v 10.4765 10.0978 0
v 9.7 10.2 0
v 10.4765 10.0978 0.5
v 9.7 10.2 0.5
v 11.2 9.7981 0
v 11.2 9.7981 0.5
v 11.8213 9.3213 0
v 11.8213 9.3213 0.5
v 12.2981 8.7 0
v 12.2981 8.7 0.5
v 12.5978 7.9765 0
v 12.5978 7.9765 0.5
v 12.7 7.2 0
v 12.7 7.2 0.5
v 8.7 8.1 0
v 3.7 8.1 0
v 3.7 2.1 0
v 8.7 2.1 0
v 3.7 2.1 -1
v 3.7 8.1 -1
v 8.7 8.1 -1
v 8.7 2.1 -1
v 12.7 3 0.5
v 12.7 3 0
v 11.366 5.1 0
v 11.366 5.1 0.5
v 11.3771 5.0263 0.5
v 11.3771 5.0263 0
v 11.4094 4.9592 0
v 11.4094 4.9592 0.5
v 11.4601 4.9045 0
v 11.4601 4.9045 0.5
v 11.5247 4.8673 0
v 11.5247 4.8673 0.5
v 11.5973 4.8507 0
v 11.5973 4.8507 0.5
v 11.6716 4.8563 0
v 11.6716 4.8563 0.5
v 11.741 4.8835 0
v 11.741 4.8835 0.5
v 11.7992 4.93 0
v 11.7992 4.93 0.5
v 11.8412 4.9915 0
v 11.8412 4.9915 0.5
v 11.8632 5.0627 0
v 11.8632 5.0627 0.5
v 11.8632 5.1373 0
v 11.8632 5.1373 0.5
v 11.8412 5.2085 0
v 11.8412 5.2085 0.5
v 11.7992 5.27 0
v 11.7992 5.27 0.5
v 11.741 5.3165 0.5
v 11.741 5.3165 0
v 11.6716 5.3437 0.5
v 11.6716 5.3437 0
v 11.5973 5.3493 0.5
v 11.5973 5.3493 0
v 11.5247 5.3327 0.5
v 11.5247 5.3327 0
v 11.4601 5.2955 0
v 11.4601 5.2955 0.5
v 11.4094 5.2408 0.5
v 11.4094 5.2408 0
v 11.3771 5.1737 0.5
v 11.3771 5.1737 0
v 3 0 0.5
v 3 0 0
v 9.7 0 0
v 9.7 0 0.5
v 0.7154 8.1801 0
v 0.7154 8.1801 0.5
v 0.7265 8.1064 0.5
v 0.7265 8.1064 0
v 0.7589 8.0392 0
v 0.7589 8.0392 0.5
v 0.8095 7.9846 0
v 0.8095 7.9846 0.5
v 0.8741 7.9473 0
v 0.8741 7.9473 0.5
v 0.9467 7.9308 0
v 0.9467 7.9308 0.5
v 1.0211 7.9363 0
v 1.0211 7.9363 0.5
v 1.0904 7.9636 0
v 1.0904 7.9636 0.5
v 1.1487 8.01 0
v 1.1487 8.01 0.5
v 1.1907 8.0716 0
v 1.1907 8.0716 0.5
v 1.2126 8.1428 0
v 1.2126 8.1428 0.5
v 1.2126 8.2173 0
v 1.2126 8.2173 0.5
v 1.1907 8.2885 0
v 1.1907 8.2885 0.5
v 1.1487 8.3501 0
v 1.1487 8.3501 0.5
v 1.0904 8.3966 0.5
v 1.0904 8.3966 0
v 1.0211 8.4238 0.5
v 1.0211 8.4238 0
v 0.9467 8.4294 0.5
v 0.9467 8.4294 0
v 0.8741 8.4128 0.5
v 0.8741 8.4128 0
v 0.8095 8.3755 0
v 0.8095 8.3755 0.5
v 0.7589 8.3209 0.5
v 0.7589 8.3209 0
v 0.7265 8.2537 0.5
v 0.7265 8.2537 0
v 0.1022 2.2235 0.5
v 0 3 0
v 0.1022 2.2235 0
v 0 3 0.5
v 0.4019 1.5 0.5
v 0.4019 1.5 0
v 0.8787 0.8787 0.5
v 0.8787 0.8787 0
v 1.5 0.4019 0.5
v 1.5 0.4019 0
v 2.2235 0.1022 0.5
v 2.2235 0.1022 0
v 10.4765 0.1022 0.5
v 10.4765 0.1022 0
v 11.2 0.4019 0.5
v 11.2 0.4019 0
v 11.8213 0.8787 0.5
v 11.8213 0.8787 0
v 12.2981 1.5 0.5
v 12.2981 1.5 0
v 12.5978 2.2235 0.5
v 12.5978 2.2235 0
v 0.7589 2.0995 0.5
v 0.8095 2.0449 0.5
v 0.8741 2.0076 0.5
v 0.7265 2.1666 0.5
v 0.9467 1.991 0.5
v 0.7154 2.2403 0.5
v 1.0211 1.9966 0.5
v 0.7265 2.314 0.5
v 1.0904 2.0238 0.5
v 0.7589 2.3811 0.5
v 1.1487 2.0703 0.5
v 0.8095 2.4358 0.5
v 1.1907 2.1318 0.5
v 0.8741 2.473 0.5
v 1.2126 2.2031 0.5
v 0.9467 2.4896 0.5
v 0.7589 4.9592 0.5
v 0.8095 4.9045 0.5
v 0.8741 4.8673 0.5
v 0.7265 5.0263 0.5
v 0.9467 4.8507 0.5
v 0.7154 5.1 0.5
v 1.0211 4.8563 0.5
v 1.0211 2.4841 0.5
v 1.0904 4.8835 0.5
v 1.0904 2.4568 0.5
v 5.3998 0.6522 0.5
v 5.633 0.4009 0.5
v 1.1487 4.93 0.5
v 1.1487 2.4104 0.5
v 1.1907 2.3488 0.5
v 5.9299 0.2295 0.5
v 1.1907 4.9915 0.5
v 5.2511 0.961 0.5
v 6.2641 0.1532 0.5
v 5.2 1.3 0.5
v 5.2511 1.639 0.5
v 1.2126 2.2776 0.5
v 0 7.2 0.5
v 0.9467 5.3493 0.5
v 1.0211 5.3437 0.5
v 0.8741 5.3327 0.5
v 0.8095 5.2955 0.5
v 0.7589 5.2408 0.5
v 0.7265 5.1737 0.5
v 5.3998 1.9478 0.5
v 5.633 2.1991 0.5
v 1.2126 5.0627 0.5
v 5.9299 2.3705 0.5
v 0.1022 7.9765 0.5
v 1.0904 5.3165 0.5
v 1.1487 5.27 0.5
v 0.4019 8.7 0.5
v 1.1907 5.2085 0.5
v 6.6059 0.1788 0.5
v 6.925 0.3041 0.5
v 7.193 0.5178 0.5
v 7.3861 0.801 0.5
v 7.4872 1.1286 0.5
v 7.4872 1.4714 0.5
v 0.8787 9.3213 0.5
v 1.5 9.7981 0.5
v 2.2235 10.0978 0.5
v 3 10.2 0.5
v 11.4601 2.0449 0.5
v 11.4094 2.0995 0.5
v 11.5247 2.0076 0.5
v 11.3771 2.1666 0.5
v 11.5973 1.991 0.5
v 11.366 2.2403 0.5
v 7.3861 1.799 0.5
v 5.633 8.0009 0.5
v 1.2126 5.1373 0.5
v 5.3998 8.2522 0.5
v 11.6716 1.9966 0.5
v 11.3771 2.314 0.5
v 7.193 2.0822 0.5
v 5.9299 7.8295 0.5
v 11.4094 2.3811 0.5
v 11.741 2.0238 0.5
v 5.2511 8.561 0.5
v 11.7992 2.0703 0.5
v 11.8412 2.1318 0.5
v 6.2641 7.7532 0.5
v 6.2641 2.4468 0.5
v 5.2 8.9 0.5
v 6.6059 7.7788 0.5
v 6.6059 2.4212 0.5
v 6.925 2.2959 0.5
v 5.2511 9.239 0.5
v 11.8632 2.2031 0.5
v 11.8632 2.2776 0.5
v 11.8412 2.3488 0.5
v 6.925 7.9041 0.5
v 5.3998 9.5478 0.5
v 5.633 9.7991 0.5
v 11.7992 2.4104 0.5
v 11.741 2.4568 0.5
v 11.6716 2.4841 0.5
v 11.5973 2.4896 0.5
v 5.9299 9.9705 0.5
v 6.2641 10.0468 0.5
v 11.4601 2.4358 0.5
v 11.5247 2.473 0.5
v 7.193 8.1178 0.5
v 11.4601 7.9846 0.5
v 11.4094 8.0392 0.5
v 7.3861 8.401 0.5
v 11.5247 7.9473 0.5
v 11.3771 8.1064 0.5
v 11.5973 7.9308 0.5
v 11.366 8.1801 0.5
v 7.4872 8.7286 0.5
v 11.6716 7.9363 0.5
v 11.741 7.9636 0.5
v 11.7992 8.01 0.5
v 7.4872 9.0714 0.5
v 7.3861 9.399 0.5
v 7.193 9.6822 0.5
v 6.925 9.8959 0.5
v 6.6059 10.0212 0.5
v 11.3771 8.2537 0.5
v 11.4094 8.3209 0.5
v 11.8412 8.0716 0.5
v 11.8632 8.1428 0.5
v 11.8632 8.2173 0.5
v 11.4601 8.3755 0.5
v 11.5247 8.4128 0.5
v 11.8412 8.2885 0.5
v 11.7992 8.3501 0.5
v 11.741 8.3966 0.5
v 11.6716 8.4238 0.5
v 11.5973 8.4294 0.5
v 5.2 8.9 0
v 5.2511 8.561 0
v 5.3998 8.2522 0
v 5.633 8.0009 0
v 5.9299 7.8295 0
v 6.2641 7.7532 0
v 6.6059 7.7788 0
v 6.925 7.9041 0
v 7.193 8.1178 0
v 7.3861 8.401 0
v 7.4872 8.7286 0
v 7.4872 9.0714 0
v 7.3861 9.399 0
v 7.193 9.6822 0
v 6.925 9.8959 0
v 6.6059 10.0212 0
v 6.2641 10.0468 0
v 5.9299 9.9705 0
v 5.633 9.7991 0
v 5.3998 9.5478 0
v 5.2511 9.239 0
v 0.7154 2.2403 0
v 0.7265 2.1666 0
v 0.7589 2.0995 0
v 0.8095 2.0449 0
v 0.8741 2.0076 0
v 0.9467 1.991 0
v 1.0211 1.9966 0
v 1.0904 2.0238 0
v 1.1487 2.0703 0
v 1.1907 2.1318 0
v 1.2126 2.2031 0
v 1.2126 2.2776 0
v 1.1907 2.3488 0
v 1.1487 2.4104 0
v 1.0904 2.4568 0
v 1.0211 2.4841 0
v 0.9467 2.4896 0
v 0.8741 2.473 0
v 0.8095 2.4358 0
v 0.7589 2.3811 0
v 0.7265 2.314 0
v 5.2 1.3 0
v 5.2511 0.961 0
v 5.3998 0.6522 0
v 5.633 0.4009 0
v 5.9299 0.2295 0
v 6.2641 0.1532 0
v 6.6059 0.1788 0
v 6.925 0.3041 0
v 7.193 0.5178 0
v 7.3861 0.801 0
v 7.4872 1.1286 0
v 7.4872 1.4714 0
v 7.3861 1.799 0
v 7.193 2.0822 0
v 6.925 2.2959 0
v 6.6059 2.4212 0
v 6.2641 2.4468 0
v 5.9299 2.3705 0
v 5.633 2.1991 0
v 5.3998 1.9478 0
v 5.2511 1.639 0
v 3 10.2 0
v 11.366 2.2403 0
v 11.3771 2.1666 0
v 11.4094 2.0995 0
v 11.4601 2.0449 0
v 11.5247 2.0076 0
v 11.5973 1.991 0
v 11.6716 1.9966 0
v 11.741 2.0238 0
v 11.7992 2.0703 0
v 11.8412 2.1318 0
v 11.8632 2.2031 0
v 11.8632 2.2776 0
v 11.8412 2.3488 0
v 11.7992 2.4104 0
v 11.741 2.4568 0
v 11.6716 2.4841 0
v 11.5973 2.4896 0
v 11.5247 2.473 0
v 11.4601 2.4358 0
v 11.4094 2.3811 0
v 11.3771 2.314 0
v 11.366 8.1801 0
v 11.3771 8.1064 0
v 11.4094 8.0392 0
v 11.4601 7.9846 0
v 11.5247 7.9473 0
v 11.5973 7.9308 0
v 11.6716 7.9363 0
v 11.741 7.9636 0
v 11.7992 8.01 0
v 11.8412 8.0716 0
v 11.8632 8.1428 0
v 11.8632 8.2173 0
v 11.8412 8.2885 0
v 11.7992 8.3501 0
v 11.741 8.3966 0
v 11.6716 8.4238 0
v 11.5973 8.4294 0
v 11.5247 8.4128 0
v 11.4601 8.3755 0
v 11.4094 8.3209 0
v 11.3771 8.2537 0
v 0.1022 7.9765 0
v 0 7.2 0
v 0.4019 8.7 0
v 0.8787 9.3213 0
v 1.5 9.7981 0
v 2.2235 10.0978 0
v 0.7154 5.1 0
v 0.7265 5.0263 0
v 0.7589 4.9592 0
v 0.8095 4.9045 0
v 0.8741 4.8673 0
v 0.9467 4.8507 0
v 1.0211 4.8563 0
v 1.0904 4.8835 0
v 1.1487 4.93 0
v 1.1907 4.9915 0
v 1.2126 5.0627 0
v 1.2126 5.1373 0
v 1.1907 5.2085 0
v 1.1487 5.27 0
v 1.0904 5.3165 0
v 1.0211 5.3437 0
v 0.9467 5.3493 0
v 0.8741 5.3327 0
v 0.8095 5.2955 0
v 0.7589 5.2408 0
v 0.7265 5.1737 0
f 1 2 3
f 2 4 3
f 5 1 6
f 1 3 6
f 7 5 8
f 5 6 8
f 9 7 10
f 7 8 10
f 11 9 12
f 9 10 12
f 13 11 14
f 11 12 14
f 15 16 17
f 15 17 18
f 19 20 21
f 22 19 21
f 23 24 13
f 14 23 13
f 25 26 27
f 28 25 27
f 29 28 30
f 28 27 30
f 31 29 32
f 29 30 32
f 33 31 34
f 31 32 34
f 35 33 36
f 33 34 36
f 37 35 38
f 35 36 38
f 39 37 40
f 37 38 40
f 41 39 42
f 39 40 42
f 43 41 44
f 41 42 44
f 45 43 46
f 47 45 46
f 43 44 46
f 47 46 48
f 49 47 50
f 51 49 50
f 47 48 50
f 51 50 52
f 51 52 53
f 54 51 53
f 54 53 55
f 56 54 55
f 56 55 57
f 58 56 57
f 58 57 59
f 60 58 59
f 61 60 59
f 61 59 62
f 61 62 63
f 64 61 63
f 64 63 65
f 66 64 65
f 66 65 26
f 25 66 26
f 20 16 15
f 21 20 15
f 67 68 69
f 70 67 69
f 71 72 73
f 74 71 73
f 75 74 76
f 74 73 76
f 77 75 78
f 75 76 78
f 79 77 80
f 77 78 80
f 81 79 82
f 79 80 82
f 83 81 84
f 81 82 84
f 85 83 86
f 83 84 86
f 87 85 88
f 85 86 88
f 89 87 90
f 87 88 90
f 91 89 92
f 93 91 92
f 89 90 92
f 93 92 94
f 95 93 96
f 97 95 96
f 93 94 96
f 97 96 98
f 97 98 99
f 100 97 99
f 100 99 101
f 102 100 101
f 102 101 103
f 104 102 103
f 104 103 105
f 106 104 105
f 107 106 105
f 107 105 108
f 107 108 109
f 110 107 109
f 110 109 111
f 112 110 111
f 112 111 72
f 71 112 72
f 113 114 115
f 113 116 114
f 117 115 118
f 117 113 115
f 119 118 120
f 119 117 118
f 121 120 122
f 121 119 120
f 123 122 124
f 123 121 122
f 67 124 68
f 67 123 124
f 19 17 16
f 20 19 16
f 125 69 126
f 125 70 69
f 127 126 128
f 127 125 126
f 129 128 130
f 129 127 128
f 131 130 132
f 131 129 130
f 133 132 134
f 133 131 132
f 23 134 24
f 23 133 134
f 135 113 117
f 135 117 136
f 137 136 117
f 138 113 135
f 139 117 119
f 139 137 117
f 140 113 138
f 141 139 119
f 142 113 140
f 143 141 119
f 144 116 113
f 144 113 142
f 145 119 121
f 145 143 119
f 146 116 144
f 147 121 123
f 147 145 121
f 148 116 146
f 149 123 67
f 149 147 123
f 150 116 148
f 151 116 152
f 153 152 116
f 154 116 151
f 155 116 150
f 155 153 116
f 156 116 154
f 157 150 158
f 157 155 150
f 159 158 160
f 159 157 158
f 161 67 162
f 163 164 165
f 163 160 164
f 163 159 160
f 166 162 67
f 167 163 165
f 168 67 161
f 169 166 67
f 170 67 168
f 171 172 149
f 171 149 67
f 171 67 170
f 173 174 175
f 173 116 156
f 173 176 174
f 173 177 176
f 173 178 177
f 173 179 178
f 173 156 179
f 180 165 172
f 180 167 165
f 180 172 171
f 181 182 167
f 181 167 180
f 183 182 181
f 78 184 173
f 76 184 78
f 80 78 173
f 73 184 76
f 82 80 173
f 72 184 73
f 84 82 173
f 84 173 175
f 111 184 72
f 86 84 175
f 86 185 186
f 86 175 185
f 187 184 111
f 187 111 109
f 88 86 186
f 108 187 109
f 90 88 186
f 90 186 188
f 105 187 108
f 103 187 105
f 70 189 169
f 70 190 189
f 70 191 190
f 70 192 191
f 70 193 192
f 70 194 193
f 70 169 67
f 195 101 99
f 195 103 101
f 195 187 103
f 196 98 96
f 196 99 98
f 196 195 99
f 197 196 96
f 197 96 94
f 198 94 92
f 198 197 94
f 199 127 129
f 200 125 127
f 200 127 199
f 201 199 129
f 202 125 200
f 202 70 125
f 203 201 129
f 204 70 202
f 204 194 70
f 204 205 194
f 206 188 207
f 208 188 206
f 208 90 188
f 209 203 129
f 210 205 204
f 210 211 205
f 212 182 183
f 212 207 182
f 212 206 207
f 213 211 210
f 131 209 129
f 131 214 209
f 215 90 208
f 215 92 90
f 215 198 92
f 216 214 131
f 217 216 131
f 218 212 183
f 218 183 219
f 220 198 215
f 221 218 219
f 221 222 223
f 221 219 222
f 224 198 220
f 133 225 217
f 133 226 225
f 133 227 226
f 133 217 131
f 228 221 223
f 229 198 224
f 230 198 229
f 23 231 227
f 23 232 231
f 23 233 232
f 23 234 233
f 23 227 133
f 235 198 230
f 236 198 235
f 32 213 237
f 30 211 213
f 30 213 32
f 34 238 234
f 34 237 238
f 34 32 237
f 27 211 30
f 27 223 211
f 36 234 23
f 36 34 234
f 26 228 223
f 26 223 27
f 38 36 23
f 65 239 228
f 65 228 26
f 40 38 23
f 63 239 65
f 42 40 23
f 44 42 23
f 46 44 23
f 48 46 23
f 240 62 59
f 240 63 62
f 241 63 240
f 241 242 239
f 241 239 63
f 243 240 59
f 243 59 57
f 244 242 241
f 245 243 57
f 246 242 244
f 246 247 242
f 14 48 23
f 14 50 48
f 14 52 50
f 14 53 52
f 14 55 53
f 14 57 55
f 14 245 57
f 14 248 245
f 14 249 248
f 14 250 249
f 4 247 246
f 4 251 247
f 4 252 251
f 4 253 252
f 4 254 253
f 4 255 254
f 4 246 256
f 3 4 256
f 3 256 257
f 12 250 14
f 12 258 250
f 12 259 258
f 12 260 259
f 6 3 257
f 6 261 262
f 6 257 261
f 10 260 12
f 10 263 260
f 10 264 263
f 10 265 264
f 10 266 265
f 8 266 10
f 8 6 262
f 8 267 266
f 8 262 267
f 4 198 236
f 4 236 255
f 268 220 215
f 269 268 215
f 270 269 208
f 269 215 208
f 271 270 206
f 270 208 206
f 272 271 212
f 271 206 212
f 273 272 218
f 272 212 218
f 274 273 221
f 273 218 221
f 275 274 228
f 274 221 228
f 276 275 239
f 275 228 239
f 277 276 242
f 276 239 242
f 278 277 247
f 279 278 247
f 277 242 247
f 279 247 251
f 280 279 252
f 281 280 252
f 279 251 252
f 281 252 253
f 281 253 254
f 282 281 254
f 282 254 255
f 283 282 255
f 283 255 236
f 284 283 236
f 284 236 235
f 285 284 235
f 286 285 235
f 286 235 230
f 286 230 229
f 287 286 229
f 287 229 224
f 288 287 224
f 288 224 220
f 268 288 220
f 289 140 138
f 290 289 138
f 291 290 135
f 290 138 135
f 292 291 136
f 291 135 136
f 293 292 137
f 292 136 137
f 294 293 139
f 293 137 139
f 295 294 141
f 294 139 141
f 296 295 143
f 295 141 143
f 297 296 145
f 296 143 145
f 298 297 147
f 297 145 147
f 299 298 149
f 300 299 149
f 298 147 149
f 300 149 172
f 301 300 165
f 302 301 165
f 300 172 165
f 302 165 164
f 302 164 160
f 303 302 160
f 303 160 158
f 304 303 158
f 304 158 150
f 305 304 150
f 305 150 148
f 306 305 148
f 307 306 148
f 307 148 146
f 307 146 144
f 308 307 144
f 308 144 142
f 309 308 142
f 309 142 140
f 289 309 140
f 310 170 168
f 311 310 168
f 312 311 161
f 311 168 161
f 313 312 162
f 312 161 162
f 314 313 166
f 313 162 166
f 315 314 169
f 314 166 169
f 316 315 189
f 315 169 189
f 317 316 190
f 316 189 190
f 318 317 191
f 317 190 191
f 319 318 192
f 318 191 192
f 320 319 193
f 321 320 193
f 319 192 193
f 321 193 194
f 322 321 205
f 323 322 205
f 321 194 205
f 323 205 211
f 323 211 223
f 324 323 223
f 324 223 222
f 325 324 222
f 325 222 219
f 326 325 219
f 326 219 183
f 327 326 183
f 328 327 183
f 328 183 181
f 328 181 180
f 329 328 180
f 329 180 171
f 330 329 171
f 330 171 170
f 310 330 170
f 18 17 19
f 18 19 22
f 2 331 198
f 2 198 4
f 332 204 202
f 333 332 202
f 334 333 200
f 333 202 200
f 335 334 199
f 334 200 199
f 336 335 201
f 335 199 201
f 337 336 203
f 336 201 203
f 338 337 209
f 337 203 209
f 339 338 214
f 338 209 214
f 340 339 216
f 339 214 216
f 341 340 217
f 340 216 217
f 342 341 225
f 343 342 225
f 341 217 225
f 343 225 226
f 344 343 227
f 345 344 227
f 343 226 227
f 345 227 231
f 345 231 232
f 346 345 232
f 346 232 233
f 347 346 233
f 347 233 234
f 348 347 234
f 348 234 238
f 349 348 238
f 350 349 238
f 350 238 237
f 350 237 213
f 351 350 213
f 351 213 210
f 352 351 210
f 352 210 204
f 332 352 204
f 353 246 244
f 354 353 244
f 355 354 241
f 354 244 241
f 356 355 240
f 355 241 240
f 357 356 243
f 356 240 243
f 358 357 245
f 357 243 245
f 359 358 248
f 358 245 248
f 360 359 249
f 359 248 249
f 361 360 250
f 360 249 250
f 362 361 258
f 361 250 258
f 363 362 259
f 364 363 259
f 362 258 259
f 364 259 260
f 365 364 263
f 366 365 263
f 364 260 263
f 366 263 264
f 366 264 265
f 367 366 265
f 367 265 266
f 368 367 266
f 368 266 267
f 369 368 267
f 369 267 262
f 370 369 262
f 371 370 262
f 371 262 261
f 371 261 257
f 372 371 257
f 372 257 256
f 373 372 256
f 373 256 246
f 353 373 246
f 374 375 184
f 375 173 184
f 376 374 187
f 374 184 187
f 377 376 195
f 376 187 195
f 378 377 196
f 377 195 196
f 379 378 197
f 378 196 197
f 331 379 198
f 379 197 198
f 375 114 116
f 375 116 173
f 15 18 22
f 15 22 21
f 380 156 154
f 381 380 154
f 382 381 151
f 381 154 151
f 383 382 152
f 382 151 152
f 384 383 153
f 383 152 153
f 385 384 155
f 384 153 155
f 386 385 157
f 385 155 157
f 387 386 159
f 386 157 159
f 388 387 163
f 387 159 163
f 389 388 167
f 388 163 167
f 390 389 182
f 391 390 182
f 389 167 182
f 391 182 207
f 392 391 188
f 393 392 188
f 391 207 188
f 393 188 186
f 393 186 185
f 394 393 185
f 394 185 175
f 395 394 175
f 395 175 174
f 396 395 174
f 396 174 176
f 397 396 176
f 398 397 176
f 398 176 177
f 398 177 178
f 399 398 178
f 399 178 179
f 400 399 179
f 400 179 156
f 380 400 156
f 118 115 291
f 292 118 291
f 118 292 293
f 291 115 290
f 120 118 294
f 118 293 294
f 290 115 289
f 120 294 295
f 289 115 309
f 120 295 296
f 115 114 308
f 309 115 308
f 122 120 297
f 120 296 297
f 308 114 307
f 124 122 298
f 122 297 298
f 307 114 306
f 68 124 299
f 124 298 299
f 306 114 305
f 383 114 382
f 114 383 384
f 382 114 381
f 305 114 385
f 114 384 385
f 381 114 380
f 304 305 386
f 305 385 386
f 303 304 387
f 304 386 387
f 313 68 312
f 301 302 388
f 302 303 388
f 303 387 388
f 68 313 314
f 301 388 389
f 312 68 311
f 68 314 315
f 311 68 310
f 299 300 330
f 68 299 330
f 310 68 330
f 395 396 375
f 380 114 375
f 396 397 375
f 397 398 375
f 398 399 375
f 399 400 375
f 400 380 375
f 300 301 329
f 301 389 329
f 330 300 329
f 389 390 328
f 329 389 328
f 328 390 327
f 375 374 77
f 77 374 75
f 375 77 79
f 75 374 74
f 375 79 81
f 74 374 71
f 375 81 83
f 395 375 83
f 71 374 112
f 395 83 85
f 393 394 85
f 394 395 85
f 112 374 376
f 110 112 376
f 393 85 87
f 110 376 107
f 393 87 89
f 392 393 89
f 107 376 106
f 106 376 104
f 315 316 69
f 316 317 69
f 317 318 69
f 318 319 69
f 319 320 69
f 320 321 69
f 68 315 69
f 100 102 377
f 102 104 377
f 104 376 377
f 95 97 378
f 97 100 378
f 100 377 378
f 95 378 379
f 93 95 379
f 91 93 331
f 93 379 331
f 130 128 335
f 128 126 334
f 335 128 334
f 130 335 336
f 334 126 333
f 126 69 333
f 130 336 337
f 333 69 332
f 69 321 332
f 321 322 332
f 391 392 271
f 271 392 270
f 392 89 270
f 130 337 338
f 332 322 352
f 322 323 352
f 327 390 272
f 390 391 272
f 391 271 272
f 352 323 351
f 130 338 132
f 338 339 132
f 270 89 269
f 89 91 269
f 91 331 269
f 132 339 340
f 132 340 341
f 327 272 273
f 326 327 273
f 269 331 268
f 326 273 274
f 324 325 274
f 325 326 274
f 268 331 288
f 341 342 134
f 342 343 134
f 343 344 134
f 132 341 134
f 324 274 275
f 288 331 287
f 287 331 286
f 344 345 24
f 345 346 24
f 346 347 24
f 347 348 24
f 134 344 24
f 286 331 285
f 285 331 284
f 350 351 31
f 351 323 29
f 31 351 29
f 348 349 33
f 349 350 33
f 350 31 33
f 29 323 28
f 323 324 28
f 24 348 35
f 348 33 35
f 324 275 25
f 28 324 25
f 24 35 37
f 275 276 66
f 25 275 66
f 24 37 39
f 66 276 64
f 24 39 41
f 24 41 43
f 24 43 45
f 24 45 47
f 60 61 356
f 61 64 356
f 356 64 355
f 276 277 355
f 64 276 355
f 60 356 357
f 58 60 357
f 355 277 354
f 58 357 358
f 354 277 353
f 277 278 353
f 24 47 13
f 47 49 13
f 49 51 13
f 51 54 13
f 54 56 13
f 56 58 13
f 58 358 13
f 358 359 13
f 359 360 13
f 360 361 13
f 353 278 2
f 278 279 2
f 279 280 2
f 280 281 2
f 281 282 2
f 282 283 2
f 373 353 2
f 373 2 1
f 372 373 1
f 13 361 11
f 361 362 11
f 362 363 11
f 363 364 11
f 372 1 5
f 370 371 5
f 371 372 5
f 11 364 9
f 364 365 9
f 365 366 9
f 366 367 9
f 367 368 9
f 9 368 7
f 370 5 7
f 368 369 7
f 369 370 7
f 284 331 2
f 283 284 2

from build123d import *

# Parameters (mm, degrees)
F0_W     = 12.7
F0_H     = 10.2
F0_W_2   = 5
F0_H_2   = 6
F1_DEPTH = 0.5
F2_DEPTH = 1
F3_D     = 0.5
F4_D     = 2.3
F5_R     = 3


with BuildPart() as f1:
    # F0 (on Top) → F1 (new body)
    with BuildSketch(Plane.XY):
        with Locations((6.35, 5.1)):
            Rectangle(F0_W, F0_H)
        with Locations((6.2, 5.1)):
            Rectangle(F0_W_2, F0_H_2, mode=Mode.SUBTRACT)
        with Locations((6.2, 5.1)):
            Rectangle(F0_W_2, F0_H_2)
    extrude(amount=F1_DEPTH)

    # F3 (through all)
    with Locations(Plane(origin=(0, 0, 0), x_dir=(1, 0, 0), z_dir=(0, 0, -1))):
        with Locations((11.6159860045, -2.2403197363), (11.6159860045, -5.1), (11.6159860045, -8.1800576299), (0.9654218447, -8.1800576299), (0.9654218447, -5.1), (0.9654218447, -2.2403197363)):
            Hole(F3_D / 2)

    # F4 (through all)
    with Locations(Plane(origin=(0, 0, 0), x_dir=(1, 0, 0), z_dir=(0, 0, -1))):
        with Locations((6.35, -1.3), (6.35, -8.9)):
            Hole(F4_D / 2)

    # F5
    f5_edges = [f1.edges().sort_by_distance(p)[0] for p in [
        (0, 10.2, 0.25),
        (12.7, 10.2, 0.25),
        (0, 0, 0.25),
        (12.7, 0, 0.25),
    ]]
    fillet(f5_edges, radius=F5_R)


with BuildPart() as f2:
    # F0 (on Top) → F2 (new body)
    with BuildSketch(Plane.XY):
        with Locations((6.2, 5.1)):
            Rectangle(F0_W_2, F0_H_2)
    extrude(amount=-F2_DEPTH)


solid = Compound([f1.part, f2.part])
